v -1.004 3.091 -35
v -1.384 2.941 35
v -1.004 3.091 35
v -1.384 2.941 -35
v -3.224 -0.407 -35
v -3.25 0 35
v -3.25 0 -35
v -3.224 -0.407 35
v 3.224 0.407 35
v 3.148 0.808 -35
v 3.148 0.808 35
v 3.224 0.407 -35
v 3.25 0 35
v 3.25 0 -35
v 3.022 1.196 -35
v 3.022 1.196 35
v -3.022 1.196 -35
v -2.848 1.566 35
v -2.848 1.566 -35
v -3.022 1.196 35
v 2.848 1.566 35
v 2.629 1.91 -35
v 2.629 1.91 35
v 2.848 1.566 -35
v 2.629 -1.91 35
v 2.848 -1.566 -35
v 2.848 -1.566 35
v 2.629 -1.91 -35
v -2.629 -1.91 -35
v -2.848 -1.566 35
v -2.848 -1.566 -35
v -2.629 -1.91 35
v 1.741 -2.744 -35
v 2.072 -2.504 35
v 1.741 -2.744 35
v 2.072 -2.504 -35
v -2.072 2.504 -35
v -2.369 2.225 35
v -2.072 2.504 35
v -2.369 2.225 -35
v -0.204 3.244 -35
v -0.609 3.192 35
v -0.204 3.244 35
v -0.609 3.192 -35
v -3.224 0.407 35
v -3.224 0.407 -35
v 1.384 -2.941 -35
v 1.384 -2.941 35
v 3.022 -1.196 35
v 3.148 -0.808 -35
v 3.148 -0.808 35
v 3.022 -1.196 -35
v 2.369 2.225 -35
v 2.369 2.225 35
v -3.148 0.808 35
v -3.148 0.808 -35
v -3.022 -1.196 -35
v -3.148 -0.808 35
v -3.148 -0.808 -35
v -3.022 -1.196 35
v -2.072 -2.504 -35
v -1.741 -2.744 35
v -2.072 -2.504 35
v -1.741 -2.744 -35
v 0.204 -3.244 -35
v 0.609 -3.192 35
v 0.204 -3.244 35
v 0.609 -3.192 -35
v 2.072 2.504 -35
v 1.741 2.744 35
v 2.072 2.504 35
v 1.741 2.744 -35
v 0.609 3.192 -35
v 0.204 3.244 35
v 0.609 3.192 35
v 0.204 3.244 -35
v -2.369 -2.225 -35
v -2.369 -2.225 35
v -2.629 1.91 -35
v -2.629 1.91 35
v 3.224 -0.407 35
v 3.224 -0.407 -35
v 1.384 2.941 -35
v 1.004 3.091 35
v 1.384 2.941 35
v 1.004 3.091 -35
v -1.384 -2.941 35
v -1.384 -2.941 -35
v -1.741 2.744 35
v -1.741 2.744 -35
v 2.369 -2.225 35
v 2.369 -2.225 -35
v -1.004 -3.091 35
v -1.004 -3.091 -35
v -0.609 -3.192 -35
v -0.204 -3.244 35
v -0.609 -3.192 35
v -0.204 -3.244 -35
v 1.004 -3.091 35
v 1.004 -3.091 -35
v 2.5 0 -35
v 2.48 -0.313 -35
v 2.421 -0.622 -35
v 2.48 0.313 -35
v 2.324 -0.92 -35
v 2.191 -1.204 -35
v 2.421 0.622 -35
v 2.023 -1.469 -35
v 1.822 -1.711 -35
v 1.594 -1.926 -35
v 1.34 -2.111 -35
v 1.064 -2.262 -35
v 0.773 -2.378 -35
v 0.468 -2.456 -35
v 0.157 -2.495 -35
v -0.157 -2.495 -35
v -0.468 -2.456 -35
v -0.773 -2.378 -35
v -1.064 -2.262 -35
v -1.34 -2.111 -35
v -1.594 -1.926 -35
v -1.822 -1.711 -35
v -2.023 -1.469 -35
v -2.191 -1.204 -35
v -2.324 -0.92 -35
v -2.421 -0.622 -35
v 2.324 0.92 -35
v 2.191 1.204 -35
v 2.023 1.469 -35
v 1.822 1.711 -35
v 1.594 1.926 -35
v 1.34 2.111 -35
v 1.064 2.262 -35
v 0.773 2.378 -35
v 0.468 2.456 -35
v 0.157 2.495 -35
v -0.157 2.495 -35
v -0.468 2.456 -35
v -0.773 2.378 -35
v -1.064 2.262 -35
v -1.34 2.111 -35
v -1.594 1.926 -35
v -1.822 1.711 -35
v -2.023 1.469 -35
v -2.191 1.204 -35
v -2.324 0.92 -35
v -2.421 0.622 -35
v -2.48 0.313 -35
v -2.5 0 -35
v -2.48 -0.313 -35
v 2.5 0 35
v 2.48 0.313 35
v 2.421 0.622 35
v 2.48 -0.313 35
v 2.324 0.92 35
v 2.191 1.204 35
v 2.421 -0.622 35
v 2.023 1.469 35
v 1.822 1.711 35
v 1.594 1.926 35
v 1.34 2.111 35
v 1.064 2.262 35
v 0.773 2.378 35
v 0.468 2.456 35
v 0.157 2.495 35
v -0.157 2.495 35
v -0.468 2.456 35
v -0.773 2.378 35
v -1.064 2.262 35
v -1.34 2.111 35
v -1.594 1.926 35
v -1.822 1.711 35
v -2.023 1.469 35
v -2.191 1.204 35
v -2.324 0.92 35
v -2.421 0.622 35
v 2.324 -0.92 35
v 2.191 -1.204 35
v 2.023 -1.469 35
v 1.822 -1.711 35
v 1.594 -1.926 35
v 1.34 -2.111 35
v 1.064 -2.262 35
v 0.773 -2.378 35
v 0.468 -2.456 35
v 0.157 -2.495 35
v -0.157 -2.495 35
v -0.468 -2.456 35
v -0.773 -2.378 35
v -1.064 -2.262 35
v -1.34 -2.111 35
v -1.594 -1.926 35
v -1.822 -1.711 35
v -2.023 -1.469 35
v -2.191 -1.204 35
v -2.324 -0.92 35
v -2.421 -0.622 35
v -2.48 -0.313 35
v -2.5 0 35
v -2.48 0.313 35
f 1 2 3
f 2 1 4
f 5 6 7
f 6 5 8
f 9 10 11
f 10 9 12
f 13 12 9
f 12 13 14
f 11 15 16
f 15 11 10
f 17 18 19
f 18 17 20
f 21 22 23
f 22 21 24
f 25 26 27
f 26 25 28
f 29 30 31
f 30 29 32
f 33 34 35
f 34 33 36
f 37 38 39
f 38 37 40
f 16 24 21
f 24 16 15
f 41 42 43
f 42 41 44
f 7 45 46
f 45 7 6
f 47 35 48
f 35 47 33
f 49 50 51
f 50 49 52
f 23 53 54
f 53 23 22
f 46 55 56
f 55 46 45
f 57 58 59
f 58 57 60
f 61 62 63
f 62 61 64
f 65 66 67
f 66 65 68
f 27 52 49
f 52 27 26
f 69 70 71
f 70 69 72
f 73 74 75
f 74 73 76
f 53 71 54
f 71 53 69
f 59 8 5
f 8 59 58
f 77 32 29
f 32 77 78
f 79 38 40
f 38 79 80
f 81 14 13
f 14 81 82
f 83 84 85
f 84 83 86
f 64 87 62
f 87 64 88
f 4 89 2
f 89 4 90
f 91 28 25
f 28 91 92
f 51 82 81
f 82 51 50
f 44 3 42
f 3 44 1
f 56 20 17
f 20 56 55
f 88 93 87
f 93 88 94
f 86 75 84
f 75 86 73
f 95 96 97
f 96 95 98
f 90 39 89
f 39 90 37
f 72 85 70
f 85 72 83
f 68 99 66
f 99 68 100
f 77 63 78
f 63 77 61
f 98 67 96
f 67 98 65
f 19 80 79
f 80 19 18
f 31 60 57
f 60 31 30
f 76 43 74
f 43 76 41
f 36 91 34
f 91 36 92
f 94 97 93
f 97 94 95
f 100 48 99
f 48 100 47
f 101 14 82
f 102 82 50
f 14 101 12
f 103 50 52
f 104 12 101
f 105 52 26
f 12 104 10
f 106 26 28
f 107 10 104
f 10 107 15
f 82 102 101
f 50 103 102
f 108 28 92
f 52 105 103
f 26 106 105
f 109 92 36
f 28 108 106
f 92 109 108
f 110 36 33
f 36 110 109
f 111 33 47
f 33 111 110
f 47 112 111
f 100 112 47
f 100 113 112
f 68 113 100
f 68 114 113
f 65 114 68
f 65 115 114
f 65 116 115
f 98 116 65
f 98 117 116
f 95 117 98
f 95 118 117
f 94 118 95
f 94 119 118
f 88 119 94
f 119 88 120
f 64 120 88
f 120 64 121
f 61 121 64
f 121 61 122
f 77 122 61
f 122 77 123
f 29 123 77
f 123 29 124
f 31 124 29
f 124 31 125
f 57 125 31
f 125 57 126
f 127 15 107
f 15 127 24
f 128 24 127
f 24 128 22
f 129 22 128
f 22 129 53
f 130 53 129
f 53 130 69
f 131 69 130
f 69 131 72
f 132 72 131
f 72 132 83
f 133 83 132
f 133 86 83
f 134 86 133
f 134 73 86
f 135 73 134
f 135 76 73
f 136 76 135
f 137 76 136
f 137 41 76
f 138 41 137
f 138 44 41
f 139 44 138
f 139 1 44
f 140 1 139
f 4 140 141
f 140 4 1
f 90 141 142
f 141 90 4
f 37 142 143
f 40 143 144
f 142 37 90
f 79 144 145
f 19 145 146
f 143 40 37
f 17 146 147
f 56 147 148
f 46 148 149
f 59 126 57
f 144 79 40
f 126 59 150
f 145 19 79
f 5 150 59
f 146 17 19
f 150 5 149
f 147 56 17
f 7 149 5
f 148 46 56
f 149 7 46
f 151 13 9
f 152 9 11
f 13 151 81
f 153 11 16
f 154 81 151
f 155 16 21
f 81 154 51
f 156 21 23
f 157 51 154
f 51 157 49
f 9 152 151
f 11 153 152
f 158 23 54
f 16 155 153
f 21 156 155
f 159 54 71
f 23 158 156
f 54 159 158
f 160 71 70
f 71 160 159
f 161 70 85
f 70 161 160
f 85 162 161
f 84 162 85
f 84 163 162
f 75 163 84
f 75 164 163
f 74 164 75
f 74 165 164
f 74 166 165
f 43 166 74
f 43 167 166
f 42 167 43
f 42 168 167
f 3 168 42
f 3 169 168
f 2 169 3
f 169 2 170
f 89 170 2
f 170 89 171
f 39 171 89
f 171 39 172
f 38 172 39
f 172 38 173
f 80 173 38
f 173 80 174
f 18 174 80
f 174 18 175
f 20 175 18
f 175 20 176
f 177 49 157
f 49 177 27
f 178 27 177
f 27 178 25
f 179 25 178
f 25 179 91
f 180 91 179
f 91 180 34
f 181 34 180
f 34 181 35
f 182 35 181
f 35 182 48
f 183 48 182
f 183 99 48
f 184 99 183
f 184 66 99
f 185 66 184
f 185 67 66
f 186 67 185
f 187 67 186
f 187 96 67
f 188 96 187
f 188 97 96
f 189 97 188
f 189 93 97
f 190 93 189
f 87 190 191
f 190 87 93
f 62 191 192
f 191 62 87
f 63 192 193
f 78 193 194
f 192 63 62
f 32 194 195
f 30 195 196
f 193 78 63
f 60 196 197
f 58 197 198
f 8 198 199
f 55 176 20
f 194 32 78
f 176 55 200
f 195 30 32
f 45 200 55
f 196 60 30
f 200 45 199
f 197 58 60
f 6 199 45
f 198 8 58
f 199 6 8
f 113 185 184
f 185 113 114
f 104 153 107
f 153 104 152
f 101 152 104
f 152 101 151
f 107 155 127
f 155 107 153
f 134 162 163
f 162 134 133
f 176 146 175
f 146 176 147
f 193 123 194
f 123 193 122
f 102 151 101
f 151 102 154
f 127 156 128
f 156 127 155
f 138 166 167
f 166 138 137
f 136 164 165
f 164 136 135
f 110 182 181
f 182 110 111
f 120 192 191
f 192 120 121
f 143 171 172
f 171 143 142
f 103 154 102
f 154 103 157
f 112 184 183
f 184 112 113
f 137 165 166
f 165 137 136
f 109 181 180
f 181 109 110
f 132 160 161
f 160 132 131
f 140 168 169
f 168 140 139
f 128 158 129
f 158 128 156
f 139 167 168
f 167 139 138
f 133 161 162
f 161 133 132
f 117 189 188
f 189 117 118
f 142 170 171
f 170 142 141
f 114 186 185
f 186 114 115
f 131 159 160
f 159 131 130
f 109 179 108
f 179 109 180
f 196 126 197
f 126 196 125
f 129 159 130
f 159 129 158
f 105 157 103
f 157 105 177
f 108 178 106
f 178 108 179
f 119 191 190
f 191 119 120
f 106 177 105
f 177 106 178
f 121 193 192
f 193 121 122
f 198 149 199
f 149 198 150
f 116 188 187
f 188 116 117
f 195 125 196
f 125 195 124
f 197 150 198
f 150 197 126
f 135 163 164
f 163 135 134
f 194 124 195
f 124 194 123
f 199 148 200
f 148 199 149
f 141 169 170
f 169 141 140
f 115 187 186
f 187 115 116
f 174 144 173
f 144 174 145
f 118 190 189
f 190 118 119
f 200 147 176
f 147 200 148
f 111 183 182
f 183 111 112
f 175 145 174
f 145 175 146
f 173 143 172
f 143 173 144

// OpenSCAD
$fn = 50;


difference() {
	union() {
		translate(v = [0, 0, -35.0000000000]) {
			cylinder(h = 70, r = 3.2500000000);
		}
	}
	union() {
		translate(v = [0, 0, -100.0000000000]) {
			cylinder(h = 200, r = 2.5000000000);
		}
	}
}
